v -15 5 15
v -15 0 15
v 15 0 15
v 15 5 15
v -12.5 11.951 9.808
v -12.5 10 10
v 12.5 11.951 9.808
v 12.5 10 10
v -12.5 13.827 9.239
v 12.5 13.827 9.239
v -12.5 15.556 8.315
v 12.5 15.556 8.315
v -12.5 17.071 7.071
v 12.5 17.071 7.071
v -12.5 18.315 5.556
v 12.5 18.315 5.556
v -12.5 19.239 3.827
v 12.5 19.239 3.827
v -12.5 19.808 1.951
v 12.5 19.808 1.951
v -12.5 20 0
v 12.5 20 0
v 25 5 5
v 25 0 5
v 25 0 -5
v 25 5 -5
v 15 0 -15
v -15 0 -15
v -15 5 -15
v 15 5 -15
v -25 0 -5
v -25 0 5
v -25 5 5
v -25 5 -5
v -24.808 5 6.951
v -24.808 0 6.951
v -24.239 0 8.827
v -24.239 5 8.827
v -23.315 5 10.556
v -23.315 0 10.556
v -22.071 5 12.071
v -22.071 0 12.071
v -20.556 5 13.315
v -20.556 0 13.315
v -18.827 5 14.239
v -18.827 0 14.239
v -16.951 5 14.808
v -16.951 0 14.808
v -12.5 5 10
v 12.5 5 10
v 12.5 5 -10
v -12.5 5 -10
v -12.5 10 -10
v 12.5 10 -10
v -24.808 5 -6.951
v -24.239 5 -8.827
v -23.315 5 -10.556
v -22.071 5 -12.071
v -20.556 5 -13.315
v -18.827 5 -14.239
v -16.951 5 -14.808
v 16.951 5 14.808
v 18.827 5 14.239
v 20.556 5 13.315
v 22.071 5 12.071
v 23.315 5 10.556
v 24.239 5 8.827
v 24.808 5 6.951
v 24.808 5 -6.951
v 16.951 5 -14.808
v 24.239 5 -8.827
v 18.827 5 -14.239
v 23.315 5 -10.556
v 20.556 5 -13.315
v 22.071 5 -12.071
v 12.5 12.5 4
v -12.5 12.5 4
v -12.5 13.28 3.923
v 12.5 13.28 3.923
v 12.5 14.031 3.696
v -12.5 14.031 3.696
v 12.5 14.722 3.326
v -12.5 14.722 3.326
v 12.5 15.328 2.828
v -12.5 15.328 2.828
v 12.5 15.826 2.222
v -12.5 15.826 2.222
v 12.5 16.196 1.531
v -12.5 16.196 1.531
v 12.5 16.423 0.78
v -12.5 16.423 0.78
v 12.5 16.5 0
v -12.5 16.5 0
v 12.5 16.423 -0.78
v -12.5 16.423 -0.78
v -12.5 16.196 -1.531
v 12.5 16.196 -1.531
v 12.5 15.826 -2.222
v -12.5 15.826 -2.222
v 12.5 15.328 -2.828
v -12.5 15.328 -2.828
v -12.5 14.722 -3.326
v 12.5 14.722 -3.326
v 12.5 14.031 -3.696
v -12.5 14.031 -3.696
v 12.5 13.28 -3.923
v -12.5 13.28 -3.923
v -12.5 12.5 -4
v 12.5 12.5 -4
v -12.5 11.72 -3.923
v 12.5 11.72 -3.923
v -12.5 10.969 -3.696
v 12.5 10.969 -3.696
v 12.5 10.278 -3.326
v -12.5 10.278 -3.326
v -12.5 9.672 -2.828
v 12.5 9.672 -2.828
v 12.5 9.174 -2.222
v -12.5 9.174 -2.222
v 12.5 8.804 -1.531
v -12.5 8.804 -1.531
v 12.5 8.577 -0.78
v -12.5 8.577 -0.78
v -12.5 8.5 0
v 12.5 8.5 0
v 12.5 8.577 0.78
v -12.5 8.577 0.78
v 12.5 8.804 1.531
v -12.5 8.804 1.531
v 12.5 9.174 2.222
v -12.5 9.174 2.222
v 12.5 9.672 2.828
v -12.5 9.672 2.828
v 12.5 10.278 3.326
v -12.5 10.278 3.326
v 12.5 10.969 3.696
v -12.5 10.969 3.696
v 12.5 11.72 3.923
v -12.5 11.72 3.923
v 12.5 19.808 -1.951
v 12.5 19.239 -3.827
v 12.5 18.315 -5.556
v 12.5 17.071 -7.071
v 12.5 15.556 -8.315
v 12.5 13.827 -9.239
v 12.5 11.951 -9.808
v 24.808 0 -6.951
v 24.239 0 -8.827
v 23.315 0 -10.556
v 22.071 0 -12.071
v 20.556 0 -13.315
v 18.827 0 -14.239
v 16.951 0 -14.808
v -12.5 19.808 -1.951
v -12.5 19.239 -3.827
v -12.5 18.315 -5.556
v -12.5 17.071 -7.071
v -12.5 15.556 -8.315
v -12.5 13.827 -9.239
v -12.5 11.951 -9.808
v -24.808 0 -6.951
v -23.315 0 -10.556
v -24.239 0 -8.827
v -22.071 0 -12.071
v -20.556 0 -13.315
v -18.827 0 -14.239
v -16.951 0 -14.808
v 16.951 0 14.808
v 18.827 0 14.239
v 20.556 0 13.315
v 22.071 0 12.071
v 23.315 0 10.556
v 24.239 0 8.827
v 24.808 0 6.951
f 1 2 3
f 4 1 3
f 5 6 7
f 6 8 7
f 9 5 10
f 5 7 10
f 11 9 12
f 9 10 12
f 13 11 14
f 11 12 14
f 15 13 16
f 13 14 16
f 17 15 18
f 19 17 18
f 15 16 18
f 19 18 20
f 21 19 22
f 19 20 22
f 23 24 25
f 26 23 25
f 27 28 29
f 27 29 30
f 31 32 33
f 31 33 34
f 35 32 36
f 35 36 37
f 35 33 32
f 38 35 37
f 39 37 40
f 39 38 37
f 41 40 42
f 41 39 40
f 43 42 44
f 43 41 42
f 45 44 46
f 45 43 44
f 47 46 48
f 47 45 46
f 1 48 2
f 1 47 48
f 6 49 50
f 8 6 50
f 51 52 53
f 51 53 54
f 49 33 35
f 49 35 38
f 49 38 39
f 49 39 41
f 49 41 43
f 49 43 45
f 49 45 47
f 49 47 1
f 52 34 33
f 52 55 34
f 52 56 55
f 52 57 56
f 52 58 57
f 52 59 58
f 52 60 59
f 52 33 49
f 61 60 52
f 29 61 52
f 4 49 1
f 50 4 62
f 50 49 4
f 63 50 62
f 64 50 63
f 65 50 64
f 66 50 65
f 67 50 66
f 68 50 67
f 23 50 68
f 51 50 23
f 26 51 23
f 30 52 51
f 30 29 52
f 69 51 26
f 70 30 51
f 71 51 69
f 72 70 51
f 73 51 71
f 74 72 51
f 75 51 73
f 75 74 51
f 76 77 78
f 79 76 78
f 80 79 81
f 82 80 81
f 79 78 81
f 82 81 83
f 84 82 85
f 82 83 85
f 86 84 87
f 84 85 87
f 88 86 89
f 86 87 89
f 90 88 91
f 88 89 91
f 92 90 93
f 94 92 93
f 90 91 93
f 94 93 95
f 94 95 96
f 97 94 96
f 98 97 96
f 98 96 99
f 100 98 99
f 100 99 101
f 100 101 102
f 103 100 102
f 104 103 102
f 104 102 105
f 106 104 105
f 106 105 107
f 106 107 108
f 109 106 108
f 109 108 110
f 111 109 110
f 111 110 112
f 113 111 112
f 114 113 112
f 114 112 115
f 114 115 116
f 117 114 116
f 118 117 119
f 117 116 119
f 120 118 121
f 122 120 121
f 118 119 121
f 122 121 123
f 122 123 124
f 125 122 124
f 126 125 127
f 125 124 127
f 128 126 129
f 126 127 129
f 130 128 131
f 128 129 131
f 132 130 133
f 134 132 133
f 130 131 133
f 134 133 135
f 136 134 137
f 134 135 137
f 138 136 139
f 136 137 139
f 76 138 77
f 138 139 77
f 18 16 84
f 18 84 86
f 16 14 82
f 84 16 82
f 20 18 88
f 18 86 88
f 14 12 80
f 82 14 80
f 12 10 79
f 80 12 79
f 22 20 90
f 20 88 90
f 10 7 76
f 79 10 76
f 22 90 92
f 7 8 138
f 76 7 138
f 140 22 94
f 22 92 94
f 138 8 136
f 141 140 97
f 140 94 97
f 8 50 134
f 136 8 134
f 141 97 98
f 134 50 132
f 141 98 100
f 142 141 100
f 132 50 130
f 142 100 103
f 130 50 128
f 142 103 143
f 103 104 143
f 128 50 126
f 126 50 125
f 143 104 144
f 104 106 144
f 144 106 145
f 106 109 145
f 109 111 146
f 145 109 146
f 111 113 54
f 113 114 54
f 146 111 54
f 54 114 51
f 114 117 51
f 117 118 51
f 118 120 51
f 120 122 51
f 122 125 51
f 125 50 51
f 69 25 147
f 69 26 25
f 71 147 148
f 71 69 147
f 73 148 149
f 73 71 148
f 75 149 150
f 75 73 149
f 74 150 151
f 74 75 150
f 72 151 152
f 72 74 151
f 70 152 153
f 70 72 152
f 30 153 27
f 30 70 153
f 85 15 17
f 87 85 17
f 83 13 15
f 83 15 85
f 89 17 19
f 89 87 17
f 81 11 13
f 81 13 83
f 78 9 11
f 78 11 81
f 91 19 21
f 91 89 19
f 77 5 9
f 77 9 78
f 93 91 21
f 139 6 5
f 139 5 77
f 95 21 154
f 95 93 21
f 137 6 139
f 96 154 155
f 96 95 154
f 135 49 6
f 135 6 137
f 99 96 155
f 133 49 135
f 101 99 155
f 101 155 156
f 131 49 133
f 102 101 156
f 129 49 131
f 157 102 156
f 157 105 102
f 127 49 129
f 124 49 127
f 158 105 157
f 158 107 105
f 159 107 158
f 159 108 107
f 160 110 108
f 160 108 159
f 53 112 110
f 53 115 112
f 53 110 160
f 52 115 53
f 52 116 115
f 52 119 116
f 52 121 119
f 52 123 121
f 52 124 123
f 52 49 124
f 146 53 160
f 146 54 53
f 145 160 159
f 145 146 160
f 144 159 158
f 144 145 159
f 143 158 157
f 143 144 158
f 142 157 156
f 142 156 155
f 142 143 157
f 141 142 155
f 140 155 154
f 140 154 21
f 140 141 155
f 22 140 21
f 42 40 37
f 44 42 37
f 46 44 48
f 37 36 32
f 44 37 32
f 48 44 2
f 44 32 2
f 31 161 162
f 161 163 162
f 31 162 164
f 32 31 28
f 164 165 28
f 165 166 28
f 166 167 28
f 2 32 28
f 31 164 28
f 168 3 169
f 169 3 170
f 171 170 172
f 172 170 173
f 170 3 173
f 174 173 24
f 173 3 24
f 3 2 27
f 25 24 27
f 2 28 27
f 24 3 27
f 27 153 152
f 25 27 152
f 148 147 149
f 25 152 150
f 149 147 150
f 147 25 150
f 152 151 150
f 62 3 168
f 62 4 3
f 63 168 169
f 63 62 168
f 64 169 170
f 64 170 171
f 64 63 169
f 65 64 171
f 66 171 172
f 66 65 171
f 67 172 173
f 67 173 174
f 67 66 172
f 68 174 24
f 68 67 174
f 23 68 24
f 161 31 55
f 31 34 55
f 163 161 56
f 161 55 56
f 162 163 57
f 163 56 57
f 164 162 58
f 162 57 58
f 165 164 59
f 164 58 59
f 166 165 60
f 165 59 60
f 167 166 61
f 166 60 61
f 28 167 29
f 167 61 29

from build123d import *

# Parameters (mm, degrees)
SZKIC1_W                    = 50
SZKIC1_H                    = 30
DODANIE_WYCI_GNI_CIE1_DEPTH = 5
ZAOKR_GLENIE1_R             = 10
SZKIC2_W                    = 25
SZKIC2_H                    = 20
DODANIE_WYCI_GNI_CIE2_DEPTH = 15
SZKIC3_R                    = 4
WYTNIJ_WYCI_GNI_CIE1_DEPTH  = 30
ZAOKR_GLENIE2_R             = 10


with BuildPart() as part:
    # Szkic1 → Dodanie-wyciągnięcie1 (new body)
    with BuildSketch(Plane(origin=(0, 0, 0), x_dir=(1, 0, 0), z_dir=(0, 1, 0))):
        Rectangle(SZKIC1_W, SZKIC1_H)
    extrude(amount=DODANIE_WYCI_GNI_CIE1_DEPTH)

    # Zaokrąglenie1
    zaokr_glenie1_edges = [part.edges().sort_by_distance(p)[0] for p in [
        (25, 2.5, 15),
        (-25, 2.5, 15),
        (-25, 2.5, -15),
        (25, 2.5, -15),
    ]]
    fillet(zaokr_glenie1_edges, radius=ZAOKR_GLENIE1_R)

    # Szkic2 → Dodanie-wyciągnięcie2 (add)
    with BuildSketch(Plane(origin=(0, 5, 0), x_dir=(1, 0, 0), z_dir=(0, 1, 0))):
        Rectangle(SZKIC2_W, SZKIC2_H)
    extrude(amount=DODANIE_WYCI_GNI_CIE2_DEPTH)

    # Szkic3 → Wytnij-wyciągnięcie1 (cut)
    with BuildSketch(Plane.ZY.offset(12.5)):
        with Locations((0, 12.5)):
            Circle(SZKIC3_R)
    extrude(amount=-WYTNIJ_WYCI_GNI_CIE1_DEPTH, mode=Mode.SUBTRACT)

    # Zaokrąglenie2
    zaokr_glenie2_edges = [part.edges().sort_by_distance(p)[0] for p in [
        (0, 20, 10),
        (0, 20, -10),
    ]]
    fillet(zaokr_glenie2_edges, radius=ZAOKR_GLENIE2_R - 0.0001)  # a hair under: the kernel refuses the full size


solid = part.part
